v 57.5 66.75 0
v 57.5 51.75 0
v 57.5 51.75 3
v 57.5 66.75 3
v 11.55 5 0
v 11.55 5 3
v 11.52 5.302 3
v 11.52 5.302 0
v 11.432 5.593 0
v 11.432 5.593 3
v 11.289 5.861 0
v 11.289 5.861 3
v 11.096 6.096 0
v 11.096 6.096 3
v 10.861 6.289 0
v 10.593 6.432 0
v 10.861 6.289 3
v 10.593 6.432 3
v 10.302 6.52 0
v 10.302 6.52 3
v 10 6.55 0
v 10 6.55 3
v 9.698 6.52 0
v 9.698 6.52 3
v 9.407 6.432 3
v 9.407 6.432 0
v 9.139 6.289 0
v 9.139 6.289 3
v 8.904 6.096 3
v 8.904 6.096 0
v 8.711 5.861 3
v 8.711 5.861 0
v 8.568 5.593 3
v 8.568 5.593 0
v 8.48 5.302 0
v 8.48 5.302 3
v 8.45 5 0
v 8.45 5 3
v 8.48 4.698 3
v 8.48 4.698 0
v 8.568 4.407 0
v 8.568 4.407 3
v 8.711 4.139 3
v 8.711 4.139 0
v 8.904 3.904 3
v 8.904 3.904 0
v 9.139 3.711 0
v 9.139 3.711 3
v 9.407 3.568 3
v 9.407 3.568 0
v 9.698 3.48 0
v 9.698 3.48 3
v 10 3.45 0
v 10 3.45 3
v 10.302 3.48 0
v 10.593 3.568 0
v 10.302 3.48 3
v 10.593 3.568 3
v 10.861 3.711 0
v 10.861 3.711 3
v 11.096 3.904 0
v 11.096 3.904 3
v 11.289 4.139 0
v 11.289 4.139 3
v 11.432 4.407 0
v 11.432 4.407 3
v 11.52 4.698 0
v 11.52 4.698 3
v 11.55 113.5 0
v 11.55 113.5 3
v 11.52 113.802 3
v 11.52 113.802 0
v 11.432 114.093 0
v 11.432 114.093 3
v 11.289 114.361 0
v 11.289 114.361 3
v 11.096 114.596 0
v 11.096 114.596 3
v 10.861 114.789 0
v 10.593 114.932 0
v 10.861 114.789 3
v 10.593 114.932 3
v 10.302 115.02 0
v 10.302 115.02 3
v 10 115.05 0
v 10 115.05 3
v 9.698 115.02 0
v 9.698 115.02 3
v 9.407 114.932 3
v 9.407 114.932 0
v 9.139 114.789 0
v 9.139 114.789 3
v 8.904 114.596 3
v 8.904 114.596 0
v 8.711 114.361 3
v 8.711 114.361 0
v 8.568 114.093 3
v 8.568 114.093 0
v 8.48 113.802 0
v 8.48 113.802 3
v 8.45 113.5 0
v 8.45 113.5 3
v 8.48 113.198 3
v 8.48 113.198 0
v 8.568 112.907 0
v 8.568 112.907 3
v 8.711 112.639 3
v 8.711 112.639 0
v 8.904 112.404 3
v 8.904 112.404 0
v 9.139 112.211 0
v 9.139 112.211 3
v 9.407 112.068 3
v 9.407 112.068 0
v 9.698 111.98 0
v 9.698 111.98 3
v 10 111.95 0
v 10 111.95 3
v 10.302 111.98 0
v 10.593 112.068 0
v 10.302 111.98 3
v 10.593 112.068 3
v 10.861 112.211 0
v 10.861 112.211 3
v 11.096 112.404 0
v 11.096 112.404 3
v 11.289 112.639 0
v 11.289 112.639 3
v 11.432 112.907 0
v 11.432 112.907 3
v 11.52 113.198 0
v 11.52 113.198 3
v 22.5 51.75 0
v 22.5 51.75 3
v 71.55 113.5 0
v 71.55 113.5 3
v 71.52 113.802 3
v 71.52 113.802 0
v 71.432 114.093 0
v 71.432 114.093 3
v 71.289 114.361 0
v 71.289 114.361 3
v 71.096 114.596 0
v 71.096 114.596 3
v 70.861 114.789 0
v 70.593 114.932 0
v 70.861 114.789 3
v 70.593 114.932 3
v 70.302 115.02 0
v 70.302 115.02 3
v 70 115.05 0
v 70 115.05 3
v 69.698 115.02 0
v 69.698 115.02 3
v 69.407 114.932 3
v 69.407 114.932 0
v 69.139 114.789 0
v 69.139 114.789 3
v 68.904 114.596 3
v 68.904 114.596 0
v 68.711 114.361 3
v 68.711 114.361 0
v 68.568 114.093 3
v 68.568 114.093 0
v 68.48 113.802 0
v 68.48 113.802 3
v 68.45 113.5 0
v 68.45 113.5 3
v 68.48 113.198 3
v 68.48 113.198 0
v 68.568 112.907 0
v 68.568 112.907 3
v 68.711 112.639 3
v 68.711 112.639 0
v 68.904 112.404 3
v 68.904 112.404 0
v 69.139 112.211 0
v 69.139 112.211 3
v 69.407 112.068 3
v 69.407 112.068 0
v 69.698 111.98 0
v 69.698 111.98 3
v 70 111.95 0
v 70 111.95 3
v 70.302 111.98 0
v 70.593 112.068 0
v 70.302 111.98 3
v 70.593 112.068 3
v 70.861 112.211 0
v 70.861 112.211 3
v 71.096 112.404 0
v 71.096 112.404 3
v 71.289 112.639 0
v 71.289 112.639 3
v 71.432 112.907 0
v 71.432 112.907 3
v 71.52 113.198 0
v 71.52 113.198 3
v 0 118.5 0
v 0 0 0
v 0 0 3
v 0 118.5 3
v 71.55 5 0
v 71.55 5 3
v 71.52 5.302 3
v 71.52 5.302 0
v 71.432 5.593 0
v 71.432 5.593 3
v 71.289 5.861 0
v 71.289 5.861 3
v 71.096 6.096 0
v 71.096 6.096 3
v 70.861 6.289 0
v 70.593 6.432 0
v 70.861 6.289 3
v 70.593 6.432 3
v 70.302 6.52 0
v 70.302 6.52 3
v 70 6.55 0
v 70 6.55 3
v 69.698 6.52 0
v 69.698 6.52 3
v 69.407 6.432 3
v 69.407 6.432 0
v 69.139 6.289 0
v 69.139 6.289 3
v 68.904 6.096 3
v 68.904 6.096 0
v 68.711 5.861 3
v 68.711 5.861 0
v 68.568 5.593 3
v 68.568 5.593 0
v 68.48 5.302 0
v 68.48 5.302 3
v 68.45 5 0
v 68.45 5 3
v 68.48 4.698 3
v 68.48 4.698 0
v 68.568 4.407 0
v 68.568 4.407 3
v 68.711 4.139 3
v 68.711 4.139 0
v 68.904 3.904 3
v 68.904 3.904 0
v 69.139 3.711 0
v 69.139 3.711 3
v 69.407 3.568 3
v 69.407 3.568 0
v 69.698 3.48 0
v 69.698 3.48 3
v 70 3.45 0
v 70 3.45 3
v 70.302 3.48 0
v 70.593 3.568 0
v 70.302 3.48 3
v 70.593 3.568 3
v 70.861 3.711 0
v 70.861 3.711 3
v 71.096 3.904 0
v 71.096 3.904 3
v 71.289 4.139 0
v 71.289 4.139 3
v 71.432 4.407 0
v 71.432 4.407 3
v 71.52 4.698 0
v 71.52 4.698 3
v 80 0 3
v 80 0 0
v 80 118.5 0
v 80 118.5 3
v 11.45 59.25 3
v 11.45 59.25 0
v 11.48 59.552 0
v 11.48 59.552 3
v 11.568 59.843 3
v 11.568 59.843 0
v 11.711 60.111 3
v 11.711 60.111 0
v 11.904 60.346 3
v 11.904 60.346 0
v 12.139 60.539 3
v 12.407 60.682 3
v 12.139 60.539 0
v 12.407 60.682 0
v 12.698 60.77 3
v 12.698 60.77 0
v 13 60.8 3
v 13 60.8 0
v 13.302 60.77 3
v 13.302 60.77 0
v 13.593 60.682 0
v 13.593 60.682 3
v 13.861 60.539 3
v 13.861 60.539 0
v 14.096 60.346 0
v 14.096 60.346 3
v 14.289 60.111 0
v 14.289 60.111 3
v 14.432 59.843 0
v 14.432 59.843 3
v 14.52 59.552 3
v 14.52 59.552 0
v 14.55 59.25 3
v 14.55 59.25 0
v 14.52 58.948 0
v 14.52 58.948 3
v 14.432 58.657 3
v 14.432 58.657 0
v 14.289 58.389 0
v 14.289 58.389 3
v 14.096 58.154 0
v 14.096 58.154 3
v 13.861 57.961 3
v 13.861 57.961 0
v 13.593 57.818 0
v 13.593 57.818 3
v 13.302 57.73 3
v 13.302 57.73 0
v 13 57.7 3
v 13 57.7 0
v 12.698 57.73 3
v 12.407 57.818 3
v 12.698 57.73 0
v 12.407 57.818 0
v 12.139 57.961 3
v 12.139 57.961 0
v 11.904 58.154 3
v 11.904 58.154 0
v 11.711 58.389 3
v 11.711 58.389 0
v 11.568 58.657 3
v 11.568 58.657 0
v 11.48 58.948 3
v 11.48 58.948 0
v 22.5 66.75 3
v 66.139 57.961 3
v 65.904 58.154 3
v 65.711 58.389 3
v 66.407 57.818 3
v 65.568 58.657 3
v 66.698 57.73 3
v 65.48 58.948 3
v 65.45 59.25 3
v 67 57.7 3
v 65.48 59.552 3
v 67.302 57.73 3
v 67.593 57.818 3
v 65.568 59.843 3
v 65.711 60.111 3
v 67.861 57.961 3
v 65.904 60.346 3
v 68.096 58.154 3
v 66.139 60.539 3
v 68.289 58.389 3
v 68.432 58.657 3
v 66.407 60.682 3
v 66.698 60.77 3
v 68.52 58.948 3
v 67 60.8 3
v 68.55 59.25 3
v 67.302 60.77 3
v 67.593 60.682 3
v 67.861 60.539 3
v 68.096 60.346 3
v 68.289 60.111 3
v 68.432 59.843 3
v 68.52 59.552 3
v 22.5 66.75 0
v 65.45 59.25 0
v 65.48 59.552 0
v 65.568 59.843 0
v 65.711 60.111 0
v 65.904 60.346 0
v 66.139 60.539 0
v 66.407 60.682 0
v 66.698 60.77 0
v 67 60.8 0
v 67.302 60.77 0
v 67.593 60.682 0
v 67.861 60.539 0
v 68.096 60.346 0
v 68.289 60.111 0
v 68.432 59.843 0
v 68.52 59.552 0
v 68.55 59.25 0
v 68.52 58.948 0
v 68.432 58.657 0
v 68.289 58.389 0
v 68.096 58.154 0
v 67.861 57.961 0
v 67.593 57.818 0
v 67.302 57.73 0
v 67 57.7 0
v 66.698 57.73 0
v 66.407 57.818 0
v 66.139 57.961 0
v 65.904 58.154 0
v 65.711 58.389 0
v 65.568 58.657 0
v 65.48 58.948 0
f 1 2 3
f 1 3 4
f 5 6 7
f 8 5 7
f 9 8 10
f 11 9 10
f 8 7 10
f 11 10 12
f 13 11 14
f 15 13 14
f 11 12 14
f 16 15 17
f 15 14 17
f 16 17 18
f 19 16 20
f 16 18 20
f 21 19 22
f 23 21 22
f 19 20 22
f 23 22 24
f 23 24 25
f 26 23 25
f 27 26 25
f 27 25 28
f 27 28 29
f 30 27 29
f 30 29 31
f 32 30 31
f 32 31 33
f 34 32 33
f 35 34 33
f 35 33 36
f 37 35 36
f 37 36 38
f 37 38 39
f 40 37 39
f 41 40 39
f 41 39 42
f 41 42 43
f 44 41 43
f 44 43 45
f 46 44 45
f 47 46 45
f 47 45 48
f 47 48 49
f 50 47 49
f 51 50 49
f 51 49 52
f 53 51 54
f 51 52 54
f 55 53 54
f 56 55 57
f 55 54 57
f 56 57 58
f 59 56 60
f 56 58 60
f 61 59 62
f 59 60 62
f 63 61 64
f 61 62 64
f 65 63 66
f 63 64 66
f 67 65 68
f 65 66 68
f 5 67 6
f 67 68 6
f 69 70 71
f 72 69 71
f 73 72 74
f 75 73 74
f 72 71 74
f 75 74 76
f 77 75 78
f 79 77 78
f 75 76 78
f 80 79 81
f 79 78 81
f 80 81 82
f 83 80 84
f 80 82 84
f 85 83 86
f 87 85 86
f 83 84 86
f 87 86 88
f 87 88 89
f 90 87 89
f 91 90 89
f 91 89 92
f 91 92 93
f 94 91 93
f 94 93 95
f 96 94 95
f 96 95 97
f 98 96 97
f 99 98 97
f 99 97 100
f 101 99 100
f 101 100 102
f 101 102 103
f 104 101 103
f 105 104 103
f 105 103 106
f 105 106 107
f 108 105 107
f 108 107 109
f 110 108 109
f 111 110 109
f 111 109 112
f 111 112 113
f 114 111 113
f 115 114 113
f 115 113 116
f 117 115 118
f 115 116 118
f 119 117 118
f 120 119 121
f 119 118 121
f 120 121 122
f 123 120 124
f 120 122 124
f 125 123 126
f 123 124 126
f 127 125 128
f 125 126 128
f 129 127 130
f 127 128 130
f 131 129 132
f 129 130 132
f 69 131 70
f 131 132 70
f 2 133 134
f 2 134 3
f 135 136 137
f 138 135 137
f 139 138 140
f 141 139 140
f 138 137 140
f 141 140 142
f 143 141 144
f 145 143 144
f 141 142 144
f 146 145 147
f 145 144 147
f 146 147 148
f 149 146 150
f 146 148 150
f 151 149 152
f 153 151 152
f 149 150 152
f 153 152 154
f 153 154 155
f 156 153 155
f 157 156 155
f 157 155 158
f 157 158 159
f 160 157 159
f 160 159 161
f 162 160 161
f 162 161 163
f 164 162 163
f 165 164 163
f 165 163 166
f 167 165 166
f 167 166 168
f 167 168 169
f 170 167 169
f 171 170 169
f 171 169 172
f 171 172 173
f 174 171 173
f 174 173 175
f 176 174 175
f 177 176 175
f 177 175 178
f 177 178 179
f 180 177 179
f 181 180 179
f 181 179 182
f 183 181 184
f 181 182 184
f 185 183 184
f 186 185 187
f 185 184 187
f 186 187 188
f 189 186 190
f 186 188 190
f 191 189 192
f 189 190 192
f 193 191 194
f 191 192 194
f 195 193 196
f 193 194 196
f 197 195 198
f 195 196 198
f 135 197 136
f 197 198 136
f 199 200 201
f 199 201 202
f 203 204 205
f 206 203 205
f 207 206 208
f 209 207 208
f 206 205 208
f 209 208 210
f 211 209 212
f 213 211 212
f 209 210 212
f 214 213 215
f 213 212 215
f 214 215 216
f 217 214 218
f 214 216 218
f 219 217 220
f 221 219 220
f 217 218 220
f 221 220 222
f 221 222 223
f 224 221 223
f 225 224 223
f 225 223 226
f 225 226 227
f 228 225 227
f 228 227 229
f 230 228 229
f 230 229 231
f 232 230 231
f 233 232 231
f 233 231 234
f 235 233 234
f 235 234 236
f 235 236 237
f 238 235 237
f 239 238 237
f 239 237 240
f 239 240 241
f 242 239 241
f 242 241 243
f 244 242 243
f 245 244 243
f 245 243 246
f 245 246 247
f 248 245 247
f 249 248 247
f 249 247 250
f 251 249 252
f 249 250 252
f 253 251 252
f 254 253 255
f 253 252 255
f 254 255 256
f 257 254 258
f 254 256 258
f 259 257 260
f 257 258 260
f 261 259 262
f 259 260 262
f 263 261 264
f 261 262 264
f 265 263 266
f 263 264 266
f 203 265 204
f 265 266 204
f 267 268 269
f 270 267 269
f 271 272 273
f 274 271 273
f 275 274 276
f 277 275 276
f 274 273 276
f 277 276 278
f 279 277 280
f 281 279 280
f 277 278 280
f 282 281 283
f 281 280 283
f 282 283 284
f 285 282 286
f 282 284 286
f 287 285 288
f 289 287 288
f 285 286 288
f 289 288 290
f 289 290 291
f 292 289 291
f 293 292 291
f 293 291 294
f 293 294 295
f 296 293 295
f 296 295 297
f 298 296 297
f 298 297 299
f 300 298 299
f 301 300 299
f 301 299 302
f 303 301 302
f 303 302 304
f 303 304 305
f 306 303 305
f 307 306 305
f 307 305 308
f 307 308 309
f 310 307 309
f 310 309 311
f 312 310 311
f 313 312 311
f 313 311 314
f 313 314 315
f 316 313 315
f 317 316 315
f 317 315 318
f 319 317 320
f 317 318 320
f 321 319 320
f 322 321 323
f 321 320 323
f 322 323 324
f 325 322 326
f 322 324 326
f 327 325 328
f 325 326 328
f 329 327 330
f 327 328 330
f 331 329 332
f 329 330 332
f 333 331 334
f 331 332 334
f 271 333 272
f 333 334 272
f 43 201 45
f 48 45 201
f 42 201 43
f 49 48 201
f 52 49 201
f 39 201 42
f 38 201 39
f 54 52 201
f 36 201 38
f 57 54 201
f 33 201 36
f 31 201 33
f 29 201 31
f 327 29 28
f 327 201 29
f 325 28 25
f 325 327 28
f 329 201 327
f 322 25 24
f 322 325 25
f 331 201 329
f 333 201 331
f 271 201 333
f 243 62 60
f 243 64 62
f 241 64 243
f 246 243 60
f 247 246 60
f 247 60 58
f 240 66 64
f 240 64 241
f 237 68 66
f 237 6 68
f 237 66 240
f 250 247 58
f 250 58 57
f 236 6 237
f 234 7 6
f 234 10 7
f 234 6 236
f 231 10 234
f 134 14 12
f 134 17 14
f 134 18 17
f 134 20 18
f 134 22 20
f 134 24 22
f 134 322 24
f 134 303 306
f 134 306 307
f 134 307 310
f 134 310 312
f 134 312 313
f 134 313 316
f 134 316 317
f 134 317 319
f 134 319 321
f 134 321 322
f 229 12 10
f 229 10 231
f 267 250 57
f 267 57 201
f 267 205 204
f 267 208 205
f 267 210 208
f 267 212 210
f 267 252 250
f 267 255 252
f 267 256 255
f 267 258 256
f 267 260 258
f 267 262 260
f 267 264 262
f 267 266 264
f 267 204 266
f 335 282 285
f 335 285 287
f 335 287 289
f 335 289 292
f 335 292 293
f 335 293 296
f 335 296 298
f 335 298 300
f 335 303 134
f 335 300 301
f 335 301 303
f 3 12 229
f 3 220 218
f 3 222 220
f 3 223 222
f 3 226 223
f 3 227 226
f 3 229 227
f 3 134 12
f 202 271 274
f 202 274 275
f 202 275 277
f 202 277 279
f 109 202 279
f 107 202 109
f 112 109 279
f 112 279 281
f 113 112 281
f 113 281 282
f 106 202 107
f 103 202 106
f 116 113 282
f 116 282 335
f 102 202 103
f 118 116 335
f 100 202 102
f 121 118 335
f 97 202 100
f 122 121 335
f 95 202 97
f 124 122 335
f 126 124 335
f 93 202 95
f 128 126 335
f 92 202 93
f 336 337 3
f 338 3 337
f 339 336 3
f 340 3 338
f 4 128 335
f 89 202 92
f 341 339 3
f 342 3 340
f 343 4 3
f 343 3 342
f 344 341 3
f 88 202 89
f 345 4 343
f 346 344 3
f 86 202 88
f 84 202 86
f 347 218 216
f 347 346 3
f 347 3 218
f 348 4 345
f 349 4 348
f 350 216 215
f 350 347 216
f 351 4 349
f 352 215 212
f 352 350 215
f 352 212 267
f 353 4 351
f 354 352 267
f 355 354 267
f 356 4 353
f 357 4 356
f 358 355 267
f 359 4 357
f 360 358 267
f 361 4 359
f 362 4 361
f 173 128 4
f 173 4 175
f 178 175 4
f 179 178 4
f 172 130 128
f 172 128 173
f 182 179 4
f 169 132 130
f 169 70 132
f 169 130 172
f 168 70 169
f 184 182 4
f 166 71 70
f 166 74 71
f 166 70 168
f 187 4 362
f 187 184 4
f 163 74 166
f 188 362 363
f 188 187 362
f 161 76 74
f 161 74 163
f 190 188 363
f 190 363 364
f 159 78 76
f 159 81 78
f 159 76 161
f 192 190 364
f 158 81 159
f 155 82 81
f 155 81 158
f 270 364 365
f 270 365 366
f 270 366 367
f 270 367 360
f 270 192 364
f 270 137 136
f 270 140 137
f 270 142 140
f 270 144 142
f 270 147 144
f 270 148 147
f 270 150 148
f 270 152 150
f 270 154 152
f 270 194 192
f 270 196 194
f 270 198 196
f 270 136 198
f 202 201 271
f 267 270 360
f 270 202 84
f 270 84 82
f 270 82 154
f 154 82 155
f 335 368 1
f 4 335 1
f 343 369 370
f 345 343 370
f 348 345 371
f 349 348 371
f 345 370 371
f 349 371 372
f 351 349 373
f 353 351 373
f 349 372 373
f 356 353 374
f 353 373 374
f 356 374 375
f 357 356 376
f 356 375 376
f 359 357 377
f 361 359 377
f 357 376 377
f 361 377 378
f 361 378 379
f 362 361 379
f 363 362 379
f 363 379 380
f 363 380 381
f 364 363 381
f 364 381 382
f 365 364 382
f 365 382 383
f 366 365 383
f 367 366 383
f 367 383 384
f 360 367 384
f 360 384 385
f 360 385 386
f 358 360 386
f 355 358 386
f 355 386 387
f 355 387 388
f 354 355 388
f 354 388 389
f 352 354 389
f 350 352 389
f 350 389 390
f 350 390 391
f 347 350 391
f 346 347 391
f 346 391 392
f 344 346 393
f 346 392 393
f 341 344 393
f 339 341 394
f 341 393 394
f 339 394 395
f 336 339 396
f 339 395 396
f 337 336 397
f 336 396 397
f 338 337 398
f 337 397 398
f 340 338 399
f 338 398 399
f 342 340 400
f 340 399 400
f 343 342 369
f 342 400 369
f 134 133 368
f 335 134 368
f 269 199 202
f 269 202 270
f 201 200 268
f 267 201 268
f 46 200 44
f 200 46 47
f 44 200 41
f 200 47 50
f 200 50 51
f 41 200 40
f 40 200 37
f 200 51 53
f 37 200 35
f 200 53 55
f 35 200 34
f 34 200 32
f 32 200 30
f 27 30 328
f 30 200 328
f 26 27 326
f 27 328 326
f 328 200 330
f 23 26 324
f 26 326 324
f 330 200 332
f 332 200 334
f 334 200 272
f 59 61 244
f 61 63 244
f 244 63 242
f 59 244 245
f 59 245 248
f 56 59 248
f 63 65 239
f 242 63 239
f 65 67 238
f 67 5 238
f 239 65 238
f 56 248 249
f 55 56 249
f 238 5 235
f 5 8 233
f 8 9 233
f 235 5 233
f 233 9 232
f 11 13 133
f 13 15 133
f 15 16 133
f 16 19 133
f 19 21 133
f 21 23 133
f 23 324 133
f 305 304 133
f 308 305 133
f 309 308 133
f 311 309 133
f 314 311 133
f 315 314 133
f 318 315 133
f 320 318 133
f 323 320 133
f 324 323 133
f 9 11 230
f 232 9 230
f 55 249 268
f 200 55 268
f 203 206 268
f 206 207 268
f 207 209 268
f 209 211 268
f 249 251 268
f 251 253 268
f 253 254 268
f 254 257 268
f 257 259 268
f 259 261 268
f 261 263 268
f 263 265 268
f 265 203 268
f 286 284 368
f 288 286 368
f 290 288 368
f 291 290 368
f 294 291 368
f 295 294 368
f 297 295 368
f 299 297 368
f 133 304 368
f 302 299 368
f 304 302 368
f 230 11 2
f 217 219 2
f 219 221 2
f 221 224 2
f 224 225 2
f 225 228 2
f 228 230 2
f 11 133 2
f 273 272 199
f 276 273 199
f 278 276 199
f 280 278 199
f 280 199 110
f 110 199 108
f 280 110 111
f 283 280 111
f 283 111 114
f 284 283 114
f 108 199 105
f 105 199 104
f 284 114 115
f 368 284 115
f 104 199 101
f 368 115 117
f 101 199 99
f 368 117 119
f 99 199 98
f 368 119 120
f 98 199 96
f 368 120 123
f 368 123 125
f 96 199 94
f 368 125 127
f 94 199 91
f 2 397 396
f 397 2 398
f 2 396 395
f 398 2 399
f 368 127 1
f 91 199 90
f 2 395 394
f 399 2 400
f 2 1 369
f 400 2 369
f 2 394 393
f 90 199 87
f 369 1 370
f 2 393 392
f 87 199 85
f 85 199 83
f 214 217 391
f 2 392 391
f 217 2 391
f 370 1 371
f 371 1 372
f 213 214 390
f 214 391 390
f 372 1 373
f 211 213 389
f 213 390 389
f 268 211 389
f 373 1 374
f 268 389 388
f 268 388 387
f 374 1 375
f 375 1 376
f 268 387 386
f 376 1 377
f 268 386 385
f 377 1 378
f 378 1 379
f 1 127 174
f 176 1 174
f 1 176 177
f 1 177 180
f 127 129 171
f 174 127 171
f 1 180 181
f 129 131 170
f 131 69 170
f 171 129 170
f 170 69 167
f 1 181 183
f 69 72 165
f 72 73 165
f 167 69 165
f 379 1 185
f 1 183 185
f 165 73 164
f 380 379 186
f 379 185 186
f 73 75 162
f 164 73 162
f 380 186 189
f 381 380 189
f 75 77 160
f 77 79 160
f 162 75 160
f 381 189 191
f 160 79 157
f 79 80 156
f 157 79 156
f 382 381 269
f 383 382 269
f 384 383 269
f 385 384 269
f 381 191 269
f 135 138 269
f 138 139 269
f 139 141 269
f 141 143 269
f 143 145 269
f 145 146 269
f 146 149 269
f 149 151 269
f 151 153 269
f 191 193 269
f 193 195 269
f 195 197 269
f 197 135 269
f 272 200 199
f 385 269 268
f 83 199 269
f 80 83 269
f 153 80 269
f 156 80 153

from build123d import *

# Parameters (mm, degrees)
SKETCH_1_W          = 80
SKETCH_1_H          = 118.5
SKETCH_1_W_2        = 35
SKETCH_1_H_2        = 15
EXTRUDE_1_DEPTH     = 3
CUT_EXTRUDE_2_REACH = 145.008
SKETCH_3_R          = 1.55
CUT_EXTRUDE_3_REACH = 145.008
SKETCH_4_R          = 1.55


with BuildPart() as part:
    # 草图1 → 凸台-拉伸1 (new body)
    with BuildSketch(Plane.XY):
        with Locations((40, 59.25)):
            Rectangle(SKETCH_1_W, SKETCH_1_H)
        with Locations((40, 59.25)):
            Rectangle(SKETCH_1_W_2, SKETCH_1_H_2, mode=Mode.SUBTRACT)
    extrude(amount=EXTRUDE_1_DEPTH)

    # 草图3 → 切除-拉伸2 (cut, up to next)
    with BuildSketch(Plane.XY.offset(3), mode=Mode.PRIVATE) as cut_extrude_2_sk1:
        with Locations((10, 113.5)):
            Circle(SKETCH_3_R)
    cut_extrude_2_tool1 = extrude(cut_extrude_2_sk1.sketch, amount=-CUT_EXTRUDE_2_REACH, mode=Mode.PRIVATE) & part.part
    # 草图3 → 切除-拉伸2 (cut, up to next)
    with BuildSketch(Plane.XY.offset(3), mode=Mode.PRIVATE) as cut_extrude_2_sk2:
        with Locations((70, 113.5)):
            Circle(SKETCH_3_R)
    cut_extrude_2_tool2 = extrude(cut_extrude_2_sk2.sketch, amount=-CUT_EXTRUDE_2_REACH, mode=Mode.PRIVATE) & part.part
    # 草图3 → 切除-拉伸2 (cut, up to next)
    with BuildSketch(Plane.XY.offset(3), mode=Mode.PRIVATE) as cut_extrude_2_sk3:
        with Locations((70, 5)):
            Circle(SKETCH_3_R)
    cut_extrude_2_tool3 = extrude(cut_extrude_2_sk3.sketch, amount=-CUT_EXTRUDE_2_REACH, mode=Mode.PRIVATE) & part.part
    # 草图3 → 切除-拉伸2 (cut, up to next)
    with BuildSketch(Plane.XY.offset(3), mode=Mode.PRIVATE) as cut_extrude_2_sk4:
        with Locations((10, 5)):
            Circle(SKETCH_3_R)
    cut_extrude_2_tool4 = extrude(cut_extrude_2_sk4.sketch, amount=-CUT_EXTRUDE_2_REACH, mode=Mode.PRIVATE) & part.part
    add(cut_extrude_2_tool1.solids().sort_by_distance((10, 113.5, 3))[0], mode=Mode.SUBTRACT)
    add(cut_extrude_2_tool2.solids().sort_by_distance((70, 113.5, 3))[0], mode=Mode.SUBTRACT)
    add(cut_extrude_2_tool3.solids().sort_by_distance((70, 5, 3))[0], mode=Mode.SUBTRACT)
    add(cut_extrude_2_tool4.solids().sort_by_distance((10, 5, 3))[0], mode=Mode.SUBTRACT)

    # 草图4 → 切除-拉伸3 (cut, up to next)
    with BuildSketch(Plane(origin=(0, 0, 0), x_dir=(-1, 0, 0), z_dir=(0, 0, -1)), mode=Mode.PRIVATE) as cut_extrude_3_sk1:
        with Locations((-67, 59.25)):
            Circle(SKETCH_4_R)
    cut_extrude_3_tool1 = extrude(cut_extrude_3_sk1.sketch, amount=-CUT_EXTRUDE_3_REACH, mode=Mode.PRIVATE) & part.part
    # 草图4 → 切除-拉伸3 (cut, up to next)
    with BuildSketch(Plane(origin=(0, 0, 0), x_dir=(-1, 0, 0), z_dir=(0, 0, -1)), mode=Mode.PRIVATE) as cut_extrude_3_sk2:
        with Locations((-13, 59.25)):
            Circle(SKETCH_4_R)
    cut_extrude_3_tool2 = extrude(cut_extrude_3_sk2.sketch, amount=-CUT_EXTRUDE_3_REACH, mode=Mode.PRIVATE) & part.part
    add(cut_extrude_3_tool1.solids().sort_by_distance((67, 59.25, 0))[0], mode=Mode.SUBTRACT)
    add(cut_extrude_3_tool2.solids().sort_by_distance((13, 59.25, 0))[0], mode=Mode.SUBTRACT)


solid = part.part
